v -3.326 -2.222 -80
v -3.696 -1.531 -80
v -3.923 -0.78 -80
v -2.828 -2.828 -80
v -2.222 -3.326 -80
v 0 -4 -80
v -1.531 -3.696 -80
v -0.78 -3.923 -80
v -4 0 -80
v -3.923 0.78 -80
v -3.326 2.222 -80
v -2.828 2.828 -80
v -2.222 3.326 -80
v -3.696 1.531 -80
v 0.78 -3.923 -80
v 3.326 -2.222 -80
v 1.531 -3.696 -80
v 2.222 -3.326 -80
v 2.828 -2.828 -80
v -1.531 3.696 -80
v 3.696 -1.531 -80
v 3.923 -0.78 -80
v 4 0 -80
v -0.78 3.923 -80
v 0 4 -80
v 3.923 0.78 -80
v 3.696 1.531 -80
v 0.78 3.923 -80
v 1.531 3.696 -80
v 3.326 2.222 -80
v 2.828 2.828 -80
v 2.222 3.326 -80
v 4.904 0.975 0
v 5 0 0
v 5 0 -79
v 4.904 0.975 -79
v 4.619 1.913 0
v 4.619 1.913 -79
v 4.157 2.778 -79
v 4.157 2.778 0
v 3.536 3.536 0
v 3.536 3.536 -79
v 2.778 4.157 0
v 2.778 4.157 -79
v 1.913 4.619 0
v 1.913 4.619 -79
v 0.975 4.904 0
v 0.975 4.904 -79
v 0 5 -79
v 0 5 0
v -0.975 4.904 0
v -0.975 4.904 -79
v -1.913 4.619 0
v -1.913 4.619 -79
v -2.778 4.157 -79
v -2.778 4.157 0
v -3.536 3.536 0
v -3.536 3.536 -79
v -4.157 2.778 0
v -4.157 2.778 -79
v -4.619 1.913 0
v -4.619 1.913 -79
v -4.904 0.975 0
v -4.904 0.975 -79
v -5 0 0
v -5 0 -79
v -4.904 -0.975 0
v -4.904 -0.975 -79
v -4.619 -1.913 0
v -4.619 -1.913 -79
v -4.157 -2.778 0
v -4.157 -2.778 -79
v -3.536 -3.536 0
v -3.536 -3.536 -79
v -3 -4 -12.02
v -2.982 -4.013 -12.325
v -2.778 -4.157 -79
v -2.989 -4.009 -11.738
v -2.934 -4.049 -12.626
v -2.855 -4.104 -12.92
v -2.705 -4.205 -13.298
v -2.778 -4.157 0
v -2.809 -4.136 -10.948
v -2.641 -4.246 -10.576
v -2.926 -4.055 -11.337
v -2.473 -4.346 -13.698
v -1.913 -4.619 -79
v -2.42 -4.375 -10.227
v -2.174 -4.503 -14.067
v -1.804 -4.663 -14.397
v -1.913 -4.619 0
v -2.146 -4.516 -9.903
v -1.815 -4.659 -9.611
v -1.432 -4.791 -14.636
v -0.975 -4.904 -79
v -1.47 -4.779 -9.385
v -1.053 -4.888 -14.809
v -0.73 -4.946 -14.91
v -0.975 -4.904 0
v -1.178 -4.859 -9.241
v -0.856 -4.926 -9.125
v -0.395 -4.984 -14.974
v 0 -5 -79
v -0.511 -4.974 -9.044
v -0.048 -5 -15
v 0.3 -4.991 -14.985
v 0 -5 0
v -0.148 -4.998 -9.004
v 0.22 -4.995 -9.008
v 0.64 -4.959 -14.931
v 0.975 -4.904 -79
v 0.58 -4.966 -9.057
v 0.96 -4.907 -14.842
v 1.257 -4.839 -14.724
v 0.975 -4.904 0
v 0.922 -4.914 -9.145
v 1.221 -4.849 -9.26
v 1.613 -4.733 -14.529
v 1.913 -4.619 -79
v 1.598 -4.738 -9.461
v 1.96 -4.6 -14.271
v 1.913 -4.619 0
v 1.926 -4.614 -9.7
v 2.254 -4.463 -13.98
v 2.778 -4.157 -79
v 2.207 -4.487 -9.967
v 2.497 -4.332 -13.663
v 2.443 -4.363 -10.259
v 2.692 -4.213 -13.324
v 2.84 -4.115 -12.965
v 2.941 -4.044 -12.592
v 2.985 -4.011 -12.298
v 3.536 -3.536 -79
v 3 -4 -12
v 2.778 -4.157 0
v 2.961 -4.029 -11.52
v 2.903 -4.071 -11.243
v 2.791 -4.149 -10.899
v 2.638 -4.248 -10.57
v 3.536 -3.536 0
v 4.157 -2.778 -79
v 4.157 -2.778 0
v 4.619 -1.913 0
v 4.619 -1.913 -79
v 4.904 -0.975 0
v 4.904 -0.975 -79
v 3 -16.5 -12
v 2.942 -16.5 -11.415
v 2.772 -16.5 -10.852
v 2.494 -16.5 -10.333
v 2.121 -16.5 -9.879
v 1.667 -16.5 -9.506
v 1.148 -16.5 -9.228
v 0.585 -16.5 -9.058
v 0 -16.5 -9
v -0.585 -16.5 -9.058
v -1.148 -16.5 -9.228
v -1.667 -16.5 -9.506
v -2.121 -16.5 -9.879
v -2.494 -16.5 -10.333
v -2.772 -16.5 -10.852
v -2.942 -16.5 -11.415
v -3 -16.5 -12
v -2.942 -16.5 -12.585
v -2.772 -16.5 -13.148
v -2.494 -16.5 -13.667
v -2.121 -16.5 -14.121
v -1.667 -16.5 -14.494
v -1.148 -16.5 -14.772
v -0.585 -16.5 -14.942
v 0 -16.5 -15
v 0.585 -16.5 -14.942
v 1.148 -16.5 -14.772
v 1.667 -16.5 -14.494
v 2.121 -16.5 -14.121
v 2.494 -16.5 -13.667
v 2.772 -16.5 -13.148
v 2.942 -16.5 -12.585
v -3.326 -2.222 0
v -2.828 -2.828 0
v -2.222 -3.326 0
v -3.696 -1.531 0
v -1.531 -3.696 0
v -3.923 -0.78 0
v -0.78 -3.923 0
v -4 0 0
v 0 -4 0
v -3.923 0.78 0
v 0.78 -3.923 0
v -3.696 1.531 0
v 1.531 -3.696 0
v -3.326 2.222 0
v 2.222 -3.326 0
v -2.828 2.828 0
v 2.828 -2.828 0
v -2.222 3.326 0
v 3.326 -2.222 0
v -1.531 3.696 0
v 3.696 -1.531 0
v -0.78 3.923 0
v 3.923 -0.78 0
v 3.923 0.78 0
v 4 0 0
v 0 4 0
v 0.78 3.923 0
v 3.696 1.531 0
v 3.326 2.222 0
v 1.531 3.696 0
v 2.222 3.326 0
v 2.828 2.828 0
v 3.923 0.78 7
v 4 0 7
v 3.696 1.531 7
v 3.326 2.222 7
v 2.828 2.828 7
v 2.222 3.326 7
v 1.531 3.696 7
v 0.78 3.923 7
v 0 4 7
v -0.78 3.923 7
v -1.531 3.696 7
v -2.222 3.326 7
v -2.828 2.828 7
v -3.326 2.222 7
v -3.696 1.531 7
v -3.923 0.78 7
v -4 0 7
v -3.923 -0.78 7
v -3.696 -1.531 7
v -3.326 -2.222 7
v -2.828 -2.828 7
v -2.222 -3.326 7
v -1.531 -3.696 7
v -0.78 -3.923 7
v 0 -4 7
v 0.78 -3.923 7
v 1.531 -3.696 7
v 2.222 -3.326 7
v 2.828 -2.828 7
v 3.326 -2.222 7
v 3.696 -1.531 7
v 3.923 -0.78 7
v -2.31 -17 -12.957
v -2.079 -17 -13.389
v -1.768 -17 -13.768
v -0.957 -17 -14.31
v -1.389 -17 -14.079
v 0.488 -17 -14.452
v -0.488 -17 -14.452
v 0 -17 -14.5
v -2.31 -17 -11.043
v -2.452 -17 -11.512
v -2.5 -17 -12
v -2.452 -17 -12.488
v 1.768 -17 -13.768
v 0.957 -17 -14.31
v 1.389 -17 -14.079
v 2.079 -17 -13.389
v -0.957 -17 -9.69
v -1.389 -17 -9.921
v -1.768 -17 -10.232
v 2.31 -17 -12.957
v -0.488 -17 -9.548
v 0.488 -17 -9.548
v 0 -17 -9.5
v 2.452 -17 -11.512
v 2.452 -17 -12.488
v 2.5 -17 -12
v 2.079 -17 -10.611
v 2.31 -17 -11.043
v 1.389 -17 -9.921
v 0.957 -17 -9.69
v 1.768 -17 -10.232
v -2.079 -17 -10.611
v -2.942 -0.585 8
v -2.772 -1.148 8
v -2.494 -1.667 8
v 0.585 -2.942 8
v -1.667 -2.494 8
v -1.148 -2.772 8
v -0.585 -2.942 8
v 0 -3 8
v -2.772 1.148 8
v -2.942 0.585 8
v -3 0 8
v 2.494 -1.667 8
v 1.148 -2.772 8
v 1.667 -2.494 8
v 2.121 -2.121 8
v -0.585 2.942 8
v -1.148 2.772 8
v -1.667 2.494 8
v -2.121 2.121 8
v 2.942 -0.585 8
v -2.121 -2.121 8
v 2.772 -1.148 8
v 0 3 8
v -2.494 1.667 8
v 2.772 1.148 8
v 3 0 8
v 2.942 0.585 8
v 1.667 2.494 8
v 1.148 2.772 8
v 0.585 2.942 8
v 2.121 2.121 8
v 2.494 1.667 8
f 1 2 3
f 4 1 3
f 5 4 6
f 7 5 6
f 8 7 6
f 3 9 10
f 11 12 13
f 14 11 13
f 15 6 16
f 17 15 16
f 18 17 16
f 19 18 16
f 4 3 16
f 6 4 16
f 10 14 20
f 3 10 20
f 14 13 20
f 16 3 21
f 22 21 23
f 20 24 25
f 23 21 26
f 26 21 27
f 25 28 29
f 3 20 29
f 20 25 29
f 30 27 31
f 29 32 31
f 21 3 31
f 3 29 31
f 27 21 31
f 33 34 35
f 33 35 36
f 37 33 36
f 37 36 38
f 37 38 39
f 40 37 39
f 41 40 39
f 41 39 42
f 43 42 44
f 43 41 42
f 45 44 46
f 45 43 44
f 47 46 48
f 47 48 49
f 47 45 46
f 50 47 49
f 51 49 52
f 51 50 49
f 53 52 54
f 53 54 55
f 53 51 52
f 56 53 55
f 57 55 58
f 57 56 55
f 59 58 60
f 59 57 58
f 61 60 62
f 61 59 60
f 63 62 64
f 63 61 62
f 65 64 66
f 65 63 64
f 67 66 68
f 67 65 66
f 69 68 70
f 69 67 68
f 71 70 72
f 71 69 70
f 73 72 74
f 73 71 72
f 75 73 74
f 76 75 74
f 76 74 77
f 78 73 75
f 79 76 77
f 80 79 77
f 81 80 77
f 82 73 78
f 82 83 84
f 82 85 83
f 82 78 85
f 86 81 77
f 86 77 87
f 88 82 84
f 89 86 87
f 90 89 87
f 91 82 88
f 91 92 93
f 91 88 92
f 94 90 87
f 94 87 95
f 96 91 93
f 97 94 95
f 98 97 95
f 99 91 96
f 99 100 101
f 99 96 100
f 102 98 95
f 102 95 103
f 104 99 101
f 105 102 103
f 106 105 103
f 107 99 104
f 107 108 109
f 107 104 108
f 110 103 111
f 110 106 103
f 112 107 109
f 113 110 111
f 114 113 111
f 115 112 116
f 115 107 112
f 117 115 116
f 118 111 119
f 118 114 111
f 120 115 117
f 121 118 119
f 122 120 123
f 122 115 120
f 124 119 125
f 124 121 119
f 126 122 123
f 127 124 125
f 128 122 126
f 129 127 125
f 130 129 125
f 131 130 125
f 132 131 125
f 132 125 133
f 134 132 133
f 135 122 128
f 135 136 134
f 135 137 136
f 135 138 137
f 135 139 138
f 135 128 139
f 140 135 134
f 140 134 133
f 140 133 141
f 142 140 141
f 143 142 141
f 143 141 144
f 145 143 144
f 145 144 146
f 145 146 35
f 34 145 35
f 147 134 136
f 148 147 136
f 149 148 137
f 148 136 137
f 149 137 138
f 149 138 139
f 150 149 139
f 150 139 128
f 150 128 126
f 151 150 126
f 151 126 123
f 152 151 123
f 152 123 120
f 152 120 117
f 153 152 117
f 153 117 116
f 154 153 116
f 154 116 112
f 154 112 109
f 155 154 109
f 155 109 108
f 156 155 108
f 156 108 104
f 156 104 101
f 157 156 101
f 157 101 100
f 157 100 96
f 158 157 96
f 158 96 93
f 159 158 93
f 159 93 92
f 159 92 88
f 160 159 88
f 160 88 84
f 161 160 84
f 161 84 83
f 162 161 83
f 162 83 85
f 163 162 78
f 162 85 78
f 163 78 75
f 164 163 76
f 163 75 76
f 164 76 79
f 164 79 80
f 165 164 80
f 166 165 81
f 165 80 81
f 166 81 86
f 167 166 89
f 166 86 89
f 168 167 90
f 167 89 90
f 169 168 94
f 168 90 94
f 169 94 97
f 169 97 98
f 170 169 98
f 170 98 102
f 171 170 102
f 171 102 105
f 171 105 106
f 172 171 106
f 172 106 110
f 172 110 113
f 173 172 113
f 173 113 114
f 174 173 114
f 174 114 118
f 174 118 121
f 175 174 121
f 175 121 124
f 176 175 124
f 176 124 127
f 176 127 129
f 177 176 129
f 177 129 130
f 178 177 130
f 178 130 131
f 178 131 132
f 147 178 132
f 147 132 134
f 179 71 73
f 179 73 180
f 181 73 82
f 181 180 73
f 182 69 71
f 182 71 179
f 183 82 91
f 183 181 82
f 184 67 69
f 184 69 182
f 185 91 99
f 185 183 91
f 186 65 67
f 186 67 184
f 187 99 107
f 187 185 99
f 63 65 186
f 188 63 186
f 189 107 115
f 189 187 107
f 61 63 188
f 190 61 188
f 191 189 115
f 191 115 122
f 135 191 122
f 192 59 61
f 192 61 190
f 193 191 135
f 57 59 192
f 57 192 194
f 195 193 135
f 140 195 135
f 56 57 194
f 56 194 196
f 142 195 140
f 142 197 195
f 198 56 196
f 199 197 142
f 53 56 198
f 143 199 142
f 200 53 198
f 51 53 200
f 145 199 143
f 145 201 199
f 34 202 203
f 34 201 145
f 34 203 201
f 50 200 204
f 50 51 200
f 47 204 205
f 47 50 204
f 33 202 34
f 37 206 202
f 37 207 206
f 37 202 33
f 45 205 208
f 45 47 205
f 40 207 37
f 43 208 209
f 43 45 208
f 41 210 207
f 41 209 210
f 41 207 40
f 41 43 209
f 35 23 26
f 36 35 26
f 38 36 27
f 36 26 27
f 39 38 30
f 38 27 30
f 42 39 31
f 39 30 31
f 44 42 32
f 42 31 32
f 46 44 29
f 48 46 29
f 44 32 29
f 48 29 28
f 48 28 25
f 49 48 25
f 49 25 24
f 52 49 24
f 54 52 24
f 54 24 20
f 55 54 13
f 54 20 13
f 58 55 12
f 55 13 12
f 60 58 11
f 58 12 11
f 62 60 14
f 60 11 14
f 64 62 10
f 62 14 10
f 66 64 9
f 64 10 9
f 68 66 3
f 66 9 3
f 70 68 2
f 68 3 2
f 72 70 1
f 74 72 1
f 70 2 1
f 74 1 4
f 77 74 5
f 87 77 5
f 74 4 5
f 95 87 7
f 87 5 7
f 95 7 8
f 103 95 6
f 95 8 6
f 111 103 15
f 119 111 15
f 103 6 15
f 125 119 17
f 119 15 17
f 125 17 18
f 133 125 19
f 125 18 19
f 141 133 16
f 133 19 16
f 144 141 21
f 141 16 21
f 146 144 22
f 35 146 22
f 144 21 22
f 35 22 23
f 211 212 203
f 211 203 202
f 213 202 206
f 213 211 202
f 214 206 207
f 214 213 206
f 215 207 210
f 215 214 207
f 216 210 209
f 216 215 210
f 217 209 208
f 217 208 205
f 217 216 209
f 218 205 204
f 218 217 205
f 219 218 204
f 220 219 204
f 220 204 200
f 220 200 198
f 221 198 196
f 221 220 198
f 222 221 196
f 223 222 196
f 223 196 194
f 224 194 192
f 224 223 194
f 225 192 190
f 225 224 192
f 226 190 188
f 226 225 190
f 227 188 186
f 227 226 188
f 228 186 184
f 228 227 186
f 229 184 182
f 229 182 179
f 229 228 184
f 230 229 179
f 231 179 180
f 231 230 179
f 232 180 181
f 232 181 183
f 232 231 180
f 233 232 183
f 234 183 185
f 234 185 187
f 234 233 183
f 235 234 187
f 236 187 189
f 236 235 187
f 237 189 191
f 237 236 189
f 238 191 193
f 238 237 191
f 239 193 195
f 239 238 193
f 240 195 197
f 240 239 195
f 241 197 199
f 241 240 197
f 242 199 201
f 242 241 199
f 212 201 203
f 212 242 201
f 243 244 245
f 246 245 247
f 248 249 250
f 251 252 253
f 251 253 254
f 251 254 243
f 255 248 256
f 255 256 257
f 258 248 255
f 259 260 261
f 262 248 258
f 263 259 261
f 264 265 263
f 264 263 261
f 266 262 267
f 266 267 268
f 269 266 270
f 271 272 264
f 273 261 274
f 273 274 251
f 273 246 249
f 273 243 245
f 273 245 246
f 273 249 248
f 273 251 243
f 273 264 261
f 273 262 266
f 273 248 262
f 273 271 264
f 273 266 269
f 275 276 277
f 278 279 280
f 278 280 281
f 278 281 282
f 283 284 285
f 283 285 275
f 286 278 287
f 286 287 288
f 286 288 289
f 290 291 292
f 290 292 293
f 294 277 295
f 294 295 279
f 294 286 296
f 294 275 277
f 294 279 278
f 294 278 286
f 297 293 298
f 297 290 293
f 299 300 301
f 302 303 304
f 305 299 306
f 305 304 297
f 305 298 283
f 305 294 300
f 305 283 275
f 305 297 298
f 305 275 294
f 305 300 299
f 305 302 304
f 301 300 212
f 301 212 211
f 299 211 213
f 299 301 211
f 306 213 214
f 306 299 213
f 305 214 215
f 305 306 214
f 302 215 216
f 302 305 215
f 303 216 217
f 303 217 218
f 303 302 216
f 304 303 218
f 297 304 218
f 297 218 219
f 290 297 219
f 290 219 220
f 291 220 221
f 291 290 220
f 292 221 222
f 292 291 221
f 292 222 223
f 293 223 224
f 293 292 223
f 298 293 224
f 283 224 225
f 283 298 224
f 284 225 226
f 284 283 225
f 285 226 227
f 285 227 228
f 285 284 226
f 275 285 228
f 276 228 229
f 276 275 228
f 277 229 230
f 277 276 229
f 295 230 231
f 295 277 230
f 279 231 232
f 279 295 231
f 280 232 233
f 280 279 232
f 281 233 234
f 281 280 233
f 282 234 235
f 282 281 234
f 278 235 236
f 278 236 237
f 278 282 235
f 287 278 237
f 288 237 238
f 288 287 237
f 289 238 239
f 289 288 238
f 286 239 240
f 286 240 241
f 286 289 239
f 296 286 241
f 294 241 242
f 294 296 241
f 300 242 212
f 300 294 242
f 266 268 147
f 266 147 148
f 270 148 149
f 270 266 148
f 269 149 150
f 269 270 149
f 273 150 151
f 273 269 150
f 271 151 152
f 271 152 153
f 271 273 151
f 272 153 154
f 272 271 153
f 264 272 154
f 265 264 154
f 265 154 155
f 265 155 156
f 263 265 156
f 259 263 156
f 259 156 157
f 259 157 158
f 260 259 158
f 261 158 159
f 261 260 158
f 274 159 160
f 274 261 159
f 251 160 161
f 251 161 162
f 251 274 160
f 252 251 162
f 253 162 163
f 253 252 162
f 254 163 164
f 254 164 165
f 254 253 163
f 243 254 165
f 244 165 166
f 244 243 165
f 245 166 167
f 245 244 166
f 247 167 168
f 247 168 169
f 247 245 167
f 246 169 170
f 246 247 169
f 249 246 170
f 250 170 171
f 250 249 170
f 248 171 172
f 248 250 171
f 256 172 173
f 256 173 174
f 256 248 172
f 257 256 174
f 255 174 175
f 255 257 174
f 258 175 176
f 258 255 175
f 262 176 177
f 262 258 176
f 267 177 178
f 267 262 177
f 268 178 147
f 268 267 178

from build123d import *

# Parameters (mm, degrees)
F0_R          = 4
F1_DEPTH      = 8
F1_DEPTH_BACK = 80
F0_R_2        = 5
F2_DEPTH      = 80
F3_R          = 3
F4_DEPTH      = 17
F5_SIZE       = 1
F6_SIZE       = 0.5


with BuildPart() as f1:
    # F0 (on Top) → F1 (new body, two sides)
    with BuildSketch(Plane.XY) as f1_sk:
        Circle(F0_R)
    extrude(amount=F1_DEPTH)
    extrude(f1_sk.sketch, amount=-F1_DEPTH_BACK)



with BuildPart() as f2:
    # F0 (on Top) → F2 (new body)
    with BuildSketch(Plane.XY):
        Circle(F0_R_2)
        Circle(F0_R, mode=Mode.SUBTRACT)
    extrude(amount=-F2_DEPTH)


with BuildPart() as f1_1:
    add(f1.part)

    add(f2.part)  # F4 merges F2
    # F3 (on Front) → F4 (join)
    with BuildSketch(Plane.XZ):
        with Locations((0, -12)):
            Circle(F3_R)
    extrude(amount=F4_DEPTH)

    # F5
    f5_edges = [f1_1.edges().sort_by_distance(p)[0] for p in [
        (-5, 0, -80),
        (-4, 0, 8),
    ]]
    chamfer(f5_edges, length=F5_SIZE)

    # F6
    f6_edges = [f1_1.edges().sort_by_distance(p)[0] for p in [
        (-3, -17, -12),
    ]]
    chamfer(f6_edges, length=F6_SIZE)


solid = f1_1.part
